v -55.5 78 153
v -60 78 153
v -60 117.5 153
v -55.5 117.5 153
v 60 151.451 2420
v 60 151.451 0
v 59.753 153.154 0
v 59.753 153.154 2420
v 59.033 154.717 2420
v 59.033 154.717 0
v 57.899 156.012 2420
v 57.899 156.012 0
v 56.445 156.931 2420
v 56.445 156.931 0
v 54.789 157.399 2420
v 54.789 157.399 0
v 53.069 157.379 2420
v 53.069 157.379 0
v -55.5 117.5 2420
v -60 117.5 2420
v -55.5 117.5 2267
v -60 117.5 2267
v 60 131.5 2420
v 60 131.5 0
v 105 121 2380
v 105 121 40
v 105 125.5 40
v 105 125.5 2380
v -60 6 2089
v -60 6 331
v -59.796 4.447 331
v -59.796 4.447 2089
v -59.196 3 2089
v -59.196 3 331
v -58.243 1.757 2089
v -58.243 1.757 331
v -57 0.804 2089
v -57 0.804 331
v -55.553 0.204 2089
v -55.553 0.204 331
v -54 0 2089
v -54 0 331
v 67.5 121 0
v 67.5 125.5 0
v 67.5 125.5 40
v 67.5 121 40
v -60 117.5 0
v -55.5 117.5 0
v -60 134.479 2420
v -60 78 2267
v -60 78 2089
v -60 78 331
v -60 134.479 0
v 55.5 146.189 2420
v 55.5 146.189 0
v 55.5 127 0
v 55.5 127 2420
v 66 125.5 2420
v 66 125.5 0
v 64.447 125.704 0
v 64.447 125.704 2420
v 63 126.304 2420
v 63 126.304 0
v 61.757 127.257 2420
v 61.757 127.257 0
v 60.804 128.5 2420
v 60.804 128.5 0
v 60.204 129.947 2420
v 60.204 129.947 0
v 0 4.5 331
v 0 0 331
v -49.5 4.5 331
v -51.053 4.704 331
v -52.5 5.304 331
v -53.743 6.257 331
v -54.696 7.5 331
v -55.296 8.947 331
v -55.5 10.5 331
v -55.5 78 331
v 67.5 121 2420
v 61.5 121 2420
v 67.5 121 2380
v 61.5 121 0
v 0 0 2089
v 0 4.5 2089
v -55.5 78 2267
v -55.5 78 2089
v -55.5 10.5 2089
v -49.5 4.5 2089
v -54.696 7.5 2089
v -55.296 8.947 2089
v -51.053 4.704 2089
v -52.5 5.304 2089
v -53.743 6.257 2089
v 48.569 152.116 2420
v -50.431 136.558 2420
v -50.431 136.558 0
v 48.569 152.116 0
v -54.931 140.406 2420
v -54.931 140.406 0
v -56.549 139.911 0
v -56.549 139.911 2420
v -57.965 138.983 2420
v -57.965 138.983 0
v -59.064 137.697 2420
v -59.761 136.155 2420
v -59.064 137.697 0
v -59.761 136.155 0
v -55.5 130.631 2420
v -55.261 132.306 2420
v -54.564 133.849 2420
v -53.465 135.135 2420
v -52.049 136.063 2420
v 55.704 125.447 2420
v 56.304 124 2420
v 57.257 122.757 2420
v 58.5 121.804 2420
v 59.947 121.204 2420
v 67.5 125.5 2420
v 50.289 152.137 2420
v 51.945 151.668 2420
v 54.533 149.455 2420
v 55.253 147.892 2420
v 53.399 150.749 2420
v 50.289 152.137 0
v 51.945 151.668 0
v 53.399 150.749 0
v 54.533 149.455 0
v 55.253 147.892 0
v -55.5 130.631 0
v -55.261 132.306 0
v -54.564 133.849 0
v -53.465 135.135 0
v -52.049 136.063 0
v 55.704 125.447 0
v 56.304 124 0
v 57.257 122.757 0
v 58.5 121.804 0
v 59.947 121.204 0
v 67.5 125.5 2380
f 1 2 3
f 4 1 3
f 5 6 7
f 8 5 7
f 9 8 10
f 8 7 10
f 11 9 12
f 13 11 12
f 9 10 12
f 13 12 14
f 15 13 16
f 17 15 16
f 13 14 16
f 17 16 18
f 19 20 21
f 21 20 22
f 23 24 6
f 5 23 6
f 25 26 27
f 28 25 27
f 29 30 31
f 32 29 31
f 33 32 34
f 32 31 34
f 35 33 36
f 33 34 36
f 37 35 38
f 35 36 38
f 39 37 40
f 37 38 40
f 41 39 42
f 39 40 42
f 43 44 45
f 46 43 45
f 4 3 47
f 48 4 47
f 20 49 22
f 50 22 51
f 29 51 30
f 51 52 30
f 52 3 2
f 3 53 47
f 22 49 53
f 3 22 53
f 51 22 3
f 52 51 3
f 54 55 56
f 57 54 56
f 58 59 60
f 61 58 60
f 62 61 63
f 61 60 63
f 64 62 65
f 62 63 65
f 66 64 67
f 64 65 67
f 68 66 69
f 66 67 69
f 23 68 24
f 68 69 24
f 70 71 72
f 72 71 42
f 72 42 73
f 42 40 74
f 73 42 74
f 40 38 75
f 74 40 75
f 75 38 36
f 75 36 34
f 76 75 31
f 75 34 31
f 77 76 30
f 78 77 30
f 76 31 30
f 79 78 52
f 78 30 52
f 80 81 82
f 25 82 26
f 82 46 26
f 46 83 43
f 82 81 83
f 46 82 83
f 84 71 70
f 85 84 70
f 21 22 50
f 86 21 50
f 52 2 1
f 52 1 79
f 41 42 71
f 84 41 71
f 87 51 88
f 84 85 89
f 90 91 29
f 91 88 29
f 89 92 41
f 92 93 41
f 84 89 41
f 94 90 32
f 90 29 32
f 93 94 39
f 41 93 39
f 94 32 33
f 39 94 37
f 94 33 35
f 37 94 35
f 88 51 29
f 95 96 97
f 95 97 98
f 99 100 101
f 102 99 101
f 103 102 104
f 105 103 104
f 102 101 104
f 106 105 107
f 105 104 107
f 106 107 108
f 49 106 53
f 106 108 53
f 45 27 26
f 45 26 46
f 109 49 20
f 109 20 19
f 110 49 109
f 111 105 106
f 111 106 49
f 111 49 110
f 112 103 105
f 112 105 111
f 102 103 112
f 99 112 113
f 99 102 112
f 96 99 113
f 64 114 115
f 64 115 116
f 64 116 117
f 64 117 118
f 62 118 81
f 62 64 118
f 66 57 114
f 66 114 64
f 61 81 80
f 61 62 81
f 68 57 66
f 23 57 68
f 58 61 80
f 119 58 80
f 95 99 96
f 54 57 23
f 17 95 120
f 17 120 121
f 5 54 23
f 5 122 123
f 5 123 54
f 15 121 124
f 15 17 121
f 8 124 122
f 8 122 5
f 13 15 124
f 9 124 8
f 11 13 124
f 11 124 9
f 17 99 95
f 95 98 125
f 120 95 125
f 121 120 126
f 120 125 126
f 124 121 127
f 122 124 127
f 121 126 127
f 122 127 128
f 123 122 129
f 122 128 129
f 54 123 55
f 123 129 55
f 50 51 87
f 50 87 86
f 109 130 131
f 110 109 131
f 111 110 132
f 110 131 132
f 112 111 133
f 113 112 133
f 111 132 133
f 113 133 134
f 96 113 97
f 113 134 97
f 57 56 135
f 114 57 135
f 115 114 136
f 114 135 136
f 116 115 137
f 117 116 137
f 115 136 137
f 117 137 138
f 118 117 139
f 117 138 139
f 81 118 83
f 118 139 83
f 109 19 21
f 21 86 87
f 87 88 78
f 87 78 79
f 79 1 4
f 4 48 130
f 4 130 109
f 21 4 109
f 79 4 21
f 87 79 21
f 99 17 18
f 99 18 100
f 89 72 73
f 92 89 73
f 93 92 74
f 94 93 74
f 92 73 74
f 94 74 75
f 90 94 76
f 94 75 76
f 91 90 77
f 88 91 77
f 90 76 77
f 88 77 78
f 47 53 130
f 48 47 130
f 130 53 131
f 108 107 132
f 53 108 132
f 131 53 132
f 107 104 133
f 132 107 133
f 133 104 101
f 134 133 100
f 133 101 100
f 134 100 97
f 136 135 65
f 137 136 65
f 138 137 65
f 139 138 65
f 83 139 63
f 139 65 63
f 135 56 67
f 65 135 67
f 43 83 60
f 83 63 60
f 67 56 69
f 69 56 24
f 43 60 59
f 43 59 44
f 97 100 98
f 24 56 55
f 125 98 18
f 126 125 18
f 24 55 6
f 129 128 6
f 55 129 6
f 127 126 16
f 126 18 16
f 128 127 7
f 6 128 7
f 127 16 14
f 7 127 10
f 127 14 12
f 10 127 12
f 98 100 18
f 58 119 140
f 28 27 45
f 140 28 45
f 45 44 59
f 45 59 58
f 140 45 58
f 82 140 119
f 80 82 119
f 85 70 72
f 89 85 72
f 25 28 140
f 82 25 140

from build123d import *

# Parameters (mm, degrees)
F1_DEPTH = 2420
F2_W     = 6
F2_H     = 153
F2_W_2   = 72
F2_H_2   = 178
F3_DEPTH = 165.001
F4_W     = 37.5
F4_H     = 37
F4_H_2   = 3
F4_H_3   = 40
F5_DEPTH = 125.501


with BuildPart() as f1:
    # F0 (on Top) → F1 (new body)
    with BuildSketch(Plane.XY):
        with BuildLine():
            Line((-54, 0), (0, 0))
            Line((0, 0), (0, 4.5))
            Line((0, 4.5), (-49.5, 4.5))
            ThreePointArc((-49.5, 4.5), (-53.7426406871, 6.2573593129), (-55.5, 10.5))
            Line((-55.5, 10.5), (-55.5, 130.6311523413))
            ThreePointArc((-55.5, 130.6311523413), (-54.060089269, 134.5305863848), (-50.4314713804, 136.5584081202))
            Line((-50.4314713804, 136.5584081202), (48.5685286196, 152.1163104777))
            ThreePointArc((48.5685286196, 152.1163104777), (53.3994340434, 150.7491439679), (55.5, 146.1890546989))
            Line((55.5, 146.1890546989), (55.5, 127))
            ThreePointArc((55.5, 127), (57.2573593129, 122.7573593129), (61.5, 121))
            Line((61.5, 121), (105, 121))
            Line((105, 121), (105, 125.5))
            Line((105, 125.5), (66, 125.5))
            ThreePointArc((66, 125.5), (61.7573593129, 127.2573593129), (60, 131.5))
            Line((60, 131.5), (60, 151.4514598279))
            ThreePointArc((60, 151.4514598279), (57.8994340434, 156.0115490969), (53.0685286196, 157.3787156068))
            Line((53.0685286196, 157.3787156068), (-54.9314713804, 140.4064584894))
            ThreePointArc((-54.9314713804, 140.4064584894), (-58.560089269, 138.378636754), (-60, 134.4792027106))
            Line((-60, 134.4792027106), (-60, 6))
            ThreePointArc((-60, 6), (-58.2426406871, 1.7573593129), (-54, 0))
        make_face()
    extrude(amount=F1_DEPTH)

    # F2 (on face) → F3 (cut, through all)
    with BuildSketch(Plane(origin=(-60, 0, 0), x_dir=(0, -1, 0), z_dir=(-1, 0, 0))):
        Polygon((-117.5, 153), (-117.5, 0), (-6, 0), (-6, 153), (-78, 153), align=None)
        with Locations((-3, 76.5)):
            Rectangle(F2_W, F2_H)
        with Locations((-42, 242)):
            Rectangle(F2_W_2, F2_H_2)
        with Locations((-3, 242)):
            Rectangle(F2_W, F2_H_2)
        with Locations((-42, 2178)):
            Rectangle(F2_W_2, F2_H_2)
        with Locations((-3, 2178)):
            Rectangle(F2_W, F2_H_2)
        Polygon((-6, 2420), (-117.5, 2420), (-117.5, 2267), (-78, 2267), (-6, 2267), align=None)
        with Locations((-3, 2343.5)):
            Rectangle(F2_W, F2_H)
    extrude(amount=-F3_DEPTH, mode=Mode.SUBTRACT)

    # F4 (on face) → F5 (cut, through all)
    with BuildSketch(Plane(origin=(0, 125.5, 0), x_dir=(-1, 0, 0), z_dir=(0, 1, 0))):
        with Locations((-86.25, 2398.5)):
            Rectangle(F4_W, F4_H)
        with Locations((-86.25, 2418.5)):
            Rectangle(F4_W, F4_H_2)
        with Locations((-86.25, 20)):
            Rectangle(F4_W, F4_H_3)
    extrude(amount=-F5_DEPTH, mode=Mode.SUBTRACT)


solid = f1.part
